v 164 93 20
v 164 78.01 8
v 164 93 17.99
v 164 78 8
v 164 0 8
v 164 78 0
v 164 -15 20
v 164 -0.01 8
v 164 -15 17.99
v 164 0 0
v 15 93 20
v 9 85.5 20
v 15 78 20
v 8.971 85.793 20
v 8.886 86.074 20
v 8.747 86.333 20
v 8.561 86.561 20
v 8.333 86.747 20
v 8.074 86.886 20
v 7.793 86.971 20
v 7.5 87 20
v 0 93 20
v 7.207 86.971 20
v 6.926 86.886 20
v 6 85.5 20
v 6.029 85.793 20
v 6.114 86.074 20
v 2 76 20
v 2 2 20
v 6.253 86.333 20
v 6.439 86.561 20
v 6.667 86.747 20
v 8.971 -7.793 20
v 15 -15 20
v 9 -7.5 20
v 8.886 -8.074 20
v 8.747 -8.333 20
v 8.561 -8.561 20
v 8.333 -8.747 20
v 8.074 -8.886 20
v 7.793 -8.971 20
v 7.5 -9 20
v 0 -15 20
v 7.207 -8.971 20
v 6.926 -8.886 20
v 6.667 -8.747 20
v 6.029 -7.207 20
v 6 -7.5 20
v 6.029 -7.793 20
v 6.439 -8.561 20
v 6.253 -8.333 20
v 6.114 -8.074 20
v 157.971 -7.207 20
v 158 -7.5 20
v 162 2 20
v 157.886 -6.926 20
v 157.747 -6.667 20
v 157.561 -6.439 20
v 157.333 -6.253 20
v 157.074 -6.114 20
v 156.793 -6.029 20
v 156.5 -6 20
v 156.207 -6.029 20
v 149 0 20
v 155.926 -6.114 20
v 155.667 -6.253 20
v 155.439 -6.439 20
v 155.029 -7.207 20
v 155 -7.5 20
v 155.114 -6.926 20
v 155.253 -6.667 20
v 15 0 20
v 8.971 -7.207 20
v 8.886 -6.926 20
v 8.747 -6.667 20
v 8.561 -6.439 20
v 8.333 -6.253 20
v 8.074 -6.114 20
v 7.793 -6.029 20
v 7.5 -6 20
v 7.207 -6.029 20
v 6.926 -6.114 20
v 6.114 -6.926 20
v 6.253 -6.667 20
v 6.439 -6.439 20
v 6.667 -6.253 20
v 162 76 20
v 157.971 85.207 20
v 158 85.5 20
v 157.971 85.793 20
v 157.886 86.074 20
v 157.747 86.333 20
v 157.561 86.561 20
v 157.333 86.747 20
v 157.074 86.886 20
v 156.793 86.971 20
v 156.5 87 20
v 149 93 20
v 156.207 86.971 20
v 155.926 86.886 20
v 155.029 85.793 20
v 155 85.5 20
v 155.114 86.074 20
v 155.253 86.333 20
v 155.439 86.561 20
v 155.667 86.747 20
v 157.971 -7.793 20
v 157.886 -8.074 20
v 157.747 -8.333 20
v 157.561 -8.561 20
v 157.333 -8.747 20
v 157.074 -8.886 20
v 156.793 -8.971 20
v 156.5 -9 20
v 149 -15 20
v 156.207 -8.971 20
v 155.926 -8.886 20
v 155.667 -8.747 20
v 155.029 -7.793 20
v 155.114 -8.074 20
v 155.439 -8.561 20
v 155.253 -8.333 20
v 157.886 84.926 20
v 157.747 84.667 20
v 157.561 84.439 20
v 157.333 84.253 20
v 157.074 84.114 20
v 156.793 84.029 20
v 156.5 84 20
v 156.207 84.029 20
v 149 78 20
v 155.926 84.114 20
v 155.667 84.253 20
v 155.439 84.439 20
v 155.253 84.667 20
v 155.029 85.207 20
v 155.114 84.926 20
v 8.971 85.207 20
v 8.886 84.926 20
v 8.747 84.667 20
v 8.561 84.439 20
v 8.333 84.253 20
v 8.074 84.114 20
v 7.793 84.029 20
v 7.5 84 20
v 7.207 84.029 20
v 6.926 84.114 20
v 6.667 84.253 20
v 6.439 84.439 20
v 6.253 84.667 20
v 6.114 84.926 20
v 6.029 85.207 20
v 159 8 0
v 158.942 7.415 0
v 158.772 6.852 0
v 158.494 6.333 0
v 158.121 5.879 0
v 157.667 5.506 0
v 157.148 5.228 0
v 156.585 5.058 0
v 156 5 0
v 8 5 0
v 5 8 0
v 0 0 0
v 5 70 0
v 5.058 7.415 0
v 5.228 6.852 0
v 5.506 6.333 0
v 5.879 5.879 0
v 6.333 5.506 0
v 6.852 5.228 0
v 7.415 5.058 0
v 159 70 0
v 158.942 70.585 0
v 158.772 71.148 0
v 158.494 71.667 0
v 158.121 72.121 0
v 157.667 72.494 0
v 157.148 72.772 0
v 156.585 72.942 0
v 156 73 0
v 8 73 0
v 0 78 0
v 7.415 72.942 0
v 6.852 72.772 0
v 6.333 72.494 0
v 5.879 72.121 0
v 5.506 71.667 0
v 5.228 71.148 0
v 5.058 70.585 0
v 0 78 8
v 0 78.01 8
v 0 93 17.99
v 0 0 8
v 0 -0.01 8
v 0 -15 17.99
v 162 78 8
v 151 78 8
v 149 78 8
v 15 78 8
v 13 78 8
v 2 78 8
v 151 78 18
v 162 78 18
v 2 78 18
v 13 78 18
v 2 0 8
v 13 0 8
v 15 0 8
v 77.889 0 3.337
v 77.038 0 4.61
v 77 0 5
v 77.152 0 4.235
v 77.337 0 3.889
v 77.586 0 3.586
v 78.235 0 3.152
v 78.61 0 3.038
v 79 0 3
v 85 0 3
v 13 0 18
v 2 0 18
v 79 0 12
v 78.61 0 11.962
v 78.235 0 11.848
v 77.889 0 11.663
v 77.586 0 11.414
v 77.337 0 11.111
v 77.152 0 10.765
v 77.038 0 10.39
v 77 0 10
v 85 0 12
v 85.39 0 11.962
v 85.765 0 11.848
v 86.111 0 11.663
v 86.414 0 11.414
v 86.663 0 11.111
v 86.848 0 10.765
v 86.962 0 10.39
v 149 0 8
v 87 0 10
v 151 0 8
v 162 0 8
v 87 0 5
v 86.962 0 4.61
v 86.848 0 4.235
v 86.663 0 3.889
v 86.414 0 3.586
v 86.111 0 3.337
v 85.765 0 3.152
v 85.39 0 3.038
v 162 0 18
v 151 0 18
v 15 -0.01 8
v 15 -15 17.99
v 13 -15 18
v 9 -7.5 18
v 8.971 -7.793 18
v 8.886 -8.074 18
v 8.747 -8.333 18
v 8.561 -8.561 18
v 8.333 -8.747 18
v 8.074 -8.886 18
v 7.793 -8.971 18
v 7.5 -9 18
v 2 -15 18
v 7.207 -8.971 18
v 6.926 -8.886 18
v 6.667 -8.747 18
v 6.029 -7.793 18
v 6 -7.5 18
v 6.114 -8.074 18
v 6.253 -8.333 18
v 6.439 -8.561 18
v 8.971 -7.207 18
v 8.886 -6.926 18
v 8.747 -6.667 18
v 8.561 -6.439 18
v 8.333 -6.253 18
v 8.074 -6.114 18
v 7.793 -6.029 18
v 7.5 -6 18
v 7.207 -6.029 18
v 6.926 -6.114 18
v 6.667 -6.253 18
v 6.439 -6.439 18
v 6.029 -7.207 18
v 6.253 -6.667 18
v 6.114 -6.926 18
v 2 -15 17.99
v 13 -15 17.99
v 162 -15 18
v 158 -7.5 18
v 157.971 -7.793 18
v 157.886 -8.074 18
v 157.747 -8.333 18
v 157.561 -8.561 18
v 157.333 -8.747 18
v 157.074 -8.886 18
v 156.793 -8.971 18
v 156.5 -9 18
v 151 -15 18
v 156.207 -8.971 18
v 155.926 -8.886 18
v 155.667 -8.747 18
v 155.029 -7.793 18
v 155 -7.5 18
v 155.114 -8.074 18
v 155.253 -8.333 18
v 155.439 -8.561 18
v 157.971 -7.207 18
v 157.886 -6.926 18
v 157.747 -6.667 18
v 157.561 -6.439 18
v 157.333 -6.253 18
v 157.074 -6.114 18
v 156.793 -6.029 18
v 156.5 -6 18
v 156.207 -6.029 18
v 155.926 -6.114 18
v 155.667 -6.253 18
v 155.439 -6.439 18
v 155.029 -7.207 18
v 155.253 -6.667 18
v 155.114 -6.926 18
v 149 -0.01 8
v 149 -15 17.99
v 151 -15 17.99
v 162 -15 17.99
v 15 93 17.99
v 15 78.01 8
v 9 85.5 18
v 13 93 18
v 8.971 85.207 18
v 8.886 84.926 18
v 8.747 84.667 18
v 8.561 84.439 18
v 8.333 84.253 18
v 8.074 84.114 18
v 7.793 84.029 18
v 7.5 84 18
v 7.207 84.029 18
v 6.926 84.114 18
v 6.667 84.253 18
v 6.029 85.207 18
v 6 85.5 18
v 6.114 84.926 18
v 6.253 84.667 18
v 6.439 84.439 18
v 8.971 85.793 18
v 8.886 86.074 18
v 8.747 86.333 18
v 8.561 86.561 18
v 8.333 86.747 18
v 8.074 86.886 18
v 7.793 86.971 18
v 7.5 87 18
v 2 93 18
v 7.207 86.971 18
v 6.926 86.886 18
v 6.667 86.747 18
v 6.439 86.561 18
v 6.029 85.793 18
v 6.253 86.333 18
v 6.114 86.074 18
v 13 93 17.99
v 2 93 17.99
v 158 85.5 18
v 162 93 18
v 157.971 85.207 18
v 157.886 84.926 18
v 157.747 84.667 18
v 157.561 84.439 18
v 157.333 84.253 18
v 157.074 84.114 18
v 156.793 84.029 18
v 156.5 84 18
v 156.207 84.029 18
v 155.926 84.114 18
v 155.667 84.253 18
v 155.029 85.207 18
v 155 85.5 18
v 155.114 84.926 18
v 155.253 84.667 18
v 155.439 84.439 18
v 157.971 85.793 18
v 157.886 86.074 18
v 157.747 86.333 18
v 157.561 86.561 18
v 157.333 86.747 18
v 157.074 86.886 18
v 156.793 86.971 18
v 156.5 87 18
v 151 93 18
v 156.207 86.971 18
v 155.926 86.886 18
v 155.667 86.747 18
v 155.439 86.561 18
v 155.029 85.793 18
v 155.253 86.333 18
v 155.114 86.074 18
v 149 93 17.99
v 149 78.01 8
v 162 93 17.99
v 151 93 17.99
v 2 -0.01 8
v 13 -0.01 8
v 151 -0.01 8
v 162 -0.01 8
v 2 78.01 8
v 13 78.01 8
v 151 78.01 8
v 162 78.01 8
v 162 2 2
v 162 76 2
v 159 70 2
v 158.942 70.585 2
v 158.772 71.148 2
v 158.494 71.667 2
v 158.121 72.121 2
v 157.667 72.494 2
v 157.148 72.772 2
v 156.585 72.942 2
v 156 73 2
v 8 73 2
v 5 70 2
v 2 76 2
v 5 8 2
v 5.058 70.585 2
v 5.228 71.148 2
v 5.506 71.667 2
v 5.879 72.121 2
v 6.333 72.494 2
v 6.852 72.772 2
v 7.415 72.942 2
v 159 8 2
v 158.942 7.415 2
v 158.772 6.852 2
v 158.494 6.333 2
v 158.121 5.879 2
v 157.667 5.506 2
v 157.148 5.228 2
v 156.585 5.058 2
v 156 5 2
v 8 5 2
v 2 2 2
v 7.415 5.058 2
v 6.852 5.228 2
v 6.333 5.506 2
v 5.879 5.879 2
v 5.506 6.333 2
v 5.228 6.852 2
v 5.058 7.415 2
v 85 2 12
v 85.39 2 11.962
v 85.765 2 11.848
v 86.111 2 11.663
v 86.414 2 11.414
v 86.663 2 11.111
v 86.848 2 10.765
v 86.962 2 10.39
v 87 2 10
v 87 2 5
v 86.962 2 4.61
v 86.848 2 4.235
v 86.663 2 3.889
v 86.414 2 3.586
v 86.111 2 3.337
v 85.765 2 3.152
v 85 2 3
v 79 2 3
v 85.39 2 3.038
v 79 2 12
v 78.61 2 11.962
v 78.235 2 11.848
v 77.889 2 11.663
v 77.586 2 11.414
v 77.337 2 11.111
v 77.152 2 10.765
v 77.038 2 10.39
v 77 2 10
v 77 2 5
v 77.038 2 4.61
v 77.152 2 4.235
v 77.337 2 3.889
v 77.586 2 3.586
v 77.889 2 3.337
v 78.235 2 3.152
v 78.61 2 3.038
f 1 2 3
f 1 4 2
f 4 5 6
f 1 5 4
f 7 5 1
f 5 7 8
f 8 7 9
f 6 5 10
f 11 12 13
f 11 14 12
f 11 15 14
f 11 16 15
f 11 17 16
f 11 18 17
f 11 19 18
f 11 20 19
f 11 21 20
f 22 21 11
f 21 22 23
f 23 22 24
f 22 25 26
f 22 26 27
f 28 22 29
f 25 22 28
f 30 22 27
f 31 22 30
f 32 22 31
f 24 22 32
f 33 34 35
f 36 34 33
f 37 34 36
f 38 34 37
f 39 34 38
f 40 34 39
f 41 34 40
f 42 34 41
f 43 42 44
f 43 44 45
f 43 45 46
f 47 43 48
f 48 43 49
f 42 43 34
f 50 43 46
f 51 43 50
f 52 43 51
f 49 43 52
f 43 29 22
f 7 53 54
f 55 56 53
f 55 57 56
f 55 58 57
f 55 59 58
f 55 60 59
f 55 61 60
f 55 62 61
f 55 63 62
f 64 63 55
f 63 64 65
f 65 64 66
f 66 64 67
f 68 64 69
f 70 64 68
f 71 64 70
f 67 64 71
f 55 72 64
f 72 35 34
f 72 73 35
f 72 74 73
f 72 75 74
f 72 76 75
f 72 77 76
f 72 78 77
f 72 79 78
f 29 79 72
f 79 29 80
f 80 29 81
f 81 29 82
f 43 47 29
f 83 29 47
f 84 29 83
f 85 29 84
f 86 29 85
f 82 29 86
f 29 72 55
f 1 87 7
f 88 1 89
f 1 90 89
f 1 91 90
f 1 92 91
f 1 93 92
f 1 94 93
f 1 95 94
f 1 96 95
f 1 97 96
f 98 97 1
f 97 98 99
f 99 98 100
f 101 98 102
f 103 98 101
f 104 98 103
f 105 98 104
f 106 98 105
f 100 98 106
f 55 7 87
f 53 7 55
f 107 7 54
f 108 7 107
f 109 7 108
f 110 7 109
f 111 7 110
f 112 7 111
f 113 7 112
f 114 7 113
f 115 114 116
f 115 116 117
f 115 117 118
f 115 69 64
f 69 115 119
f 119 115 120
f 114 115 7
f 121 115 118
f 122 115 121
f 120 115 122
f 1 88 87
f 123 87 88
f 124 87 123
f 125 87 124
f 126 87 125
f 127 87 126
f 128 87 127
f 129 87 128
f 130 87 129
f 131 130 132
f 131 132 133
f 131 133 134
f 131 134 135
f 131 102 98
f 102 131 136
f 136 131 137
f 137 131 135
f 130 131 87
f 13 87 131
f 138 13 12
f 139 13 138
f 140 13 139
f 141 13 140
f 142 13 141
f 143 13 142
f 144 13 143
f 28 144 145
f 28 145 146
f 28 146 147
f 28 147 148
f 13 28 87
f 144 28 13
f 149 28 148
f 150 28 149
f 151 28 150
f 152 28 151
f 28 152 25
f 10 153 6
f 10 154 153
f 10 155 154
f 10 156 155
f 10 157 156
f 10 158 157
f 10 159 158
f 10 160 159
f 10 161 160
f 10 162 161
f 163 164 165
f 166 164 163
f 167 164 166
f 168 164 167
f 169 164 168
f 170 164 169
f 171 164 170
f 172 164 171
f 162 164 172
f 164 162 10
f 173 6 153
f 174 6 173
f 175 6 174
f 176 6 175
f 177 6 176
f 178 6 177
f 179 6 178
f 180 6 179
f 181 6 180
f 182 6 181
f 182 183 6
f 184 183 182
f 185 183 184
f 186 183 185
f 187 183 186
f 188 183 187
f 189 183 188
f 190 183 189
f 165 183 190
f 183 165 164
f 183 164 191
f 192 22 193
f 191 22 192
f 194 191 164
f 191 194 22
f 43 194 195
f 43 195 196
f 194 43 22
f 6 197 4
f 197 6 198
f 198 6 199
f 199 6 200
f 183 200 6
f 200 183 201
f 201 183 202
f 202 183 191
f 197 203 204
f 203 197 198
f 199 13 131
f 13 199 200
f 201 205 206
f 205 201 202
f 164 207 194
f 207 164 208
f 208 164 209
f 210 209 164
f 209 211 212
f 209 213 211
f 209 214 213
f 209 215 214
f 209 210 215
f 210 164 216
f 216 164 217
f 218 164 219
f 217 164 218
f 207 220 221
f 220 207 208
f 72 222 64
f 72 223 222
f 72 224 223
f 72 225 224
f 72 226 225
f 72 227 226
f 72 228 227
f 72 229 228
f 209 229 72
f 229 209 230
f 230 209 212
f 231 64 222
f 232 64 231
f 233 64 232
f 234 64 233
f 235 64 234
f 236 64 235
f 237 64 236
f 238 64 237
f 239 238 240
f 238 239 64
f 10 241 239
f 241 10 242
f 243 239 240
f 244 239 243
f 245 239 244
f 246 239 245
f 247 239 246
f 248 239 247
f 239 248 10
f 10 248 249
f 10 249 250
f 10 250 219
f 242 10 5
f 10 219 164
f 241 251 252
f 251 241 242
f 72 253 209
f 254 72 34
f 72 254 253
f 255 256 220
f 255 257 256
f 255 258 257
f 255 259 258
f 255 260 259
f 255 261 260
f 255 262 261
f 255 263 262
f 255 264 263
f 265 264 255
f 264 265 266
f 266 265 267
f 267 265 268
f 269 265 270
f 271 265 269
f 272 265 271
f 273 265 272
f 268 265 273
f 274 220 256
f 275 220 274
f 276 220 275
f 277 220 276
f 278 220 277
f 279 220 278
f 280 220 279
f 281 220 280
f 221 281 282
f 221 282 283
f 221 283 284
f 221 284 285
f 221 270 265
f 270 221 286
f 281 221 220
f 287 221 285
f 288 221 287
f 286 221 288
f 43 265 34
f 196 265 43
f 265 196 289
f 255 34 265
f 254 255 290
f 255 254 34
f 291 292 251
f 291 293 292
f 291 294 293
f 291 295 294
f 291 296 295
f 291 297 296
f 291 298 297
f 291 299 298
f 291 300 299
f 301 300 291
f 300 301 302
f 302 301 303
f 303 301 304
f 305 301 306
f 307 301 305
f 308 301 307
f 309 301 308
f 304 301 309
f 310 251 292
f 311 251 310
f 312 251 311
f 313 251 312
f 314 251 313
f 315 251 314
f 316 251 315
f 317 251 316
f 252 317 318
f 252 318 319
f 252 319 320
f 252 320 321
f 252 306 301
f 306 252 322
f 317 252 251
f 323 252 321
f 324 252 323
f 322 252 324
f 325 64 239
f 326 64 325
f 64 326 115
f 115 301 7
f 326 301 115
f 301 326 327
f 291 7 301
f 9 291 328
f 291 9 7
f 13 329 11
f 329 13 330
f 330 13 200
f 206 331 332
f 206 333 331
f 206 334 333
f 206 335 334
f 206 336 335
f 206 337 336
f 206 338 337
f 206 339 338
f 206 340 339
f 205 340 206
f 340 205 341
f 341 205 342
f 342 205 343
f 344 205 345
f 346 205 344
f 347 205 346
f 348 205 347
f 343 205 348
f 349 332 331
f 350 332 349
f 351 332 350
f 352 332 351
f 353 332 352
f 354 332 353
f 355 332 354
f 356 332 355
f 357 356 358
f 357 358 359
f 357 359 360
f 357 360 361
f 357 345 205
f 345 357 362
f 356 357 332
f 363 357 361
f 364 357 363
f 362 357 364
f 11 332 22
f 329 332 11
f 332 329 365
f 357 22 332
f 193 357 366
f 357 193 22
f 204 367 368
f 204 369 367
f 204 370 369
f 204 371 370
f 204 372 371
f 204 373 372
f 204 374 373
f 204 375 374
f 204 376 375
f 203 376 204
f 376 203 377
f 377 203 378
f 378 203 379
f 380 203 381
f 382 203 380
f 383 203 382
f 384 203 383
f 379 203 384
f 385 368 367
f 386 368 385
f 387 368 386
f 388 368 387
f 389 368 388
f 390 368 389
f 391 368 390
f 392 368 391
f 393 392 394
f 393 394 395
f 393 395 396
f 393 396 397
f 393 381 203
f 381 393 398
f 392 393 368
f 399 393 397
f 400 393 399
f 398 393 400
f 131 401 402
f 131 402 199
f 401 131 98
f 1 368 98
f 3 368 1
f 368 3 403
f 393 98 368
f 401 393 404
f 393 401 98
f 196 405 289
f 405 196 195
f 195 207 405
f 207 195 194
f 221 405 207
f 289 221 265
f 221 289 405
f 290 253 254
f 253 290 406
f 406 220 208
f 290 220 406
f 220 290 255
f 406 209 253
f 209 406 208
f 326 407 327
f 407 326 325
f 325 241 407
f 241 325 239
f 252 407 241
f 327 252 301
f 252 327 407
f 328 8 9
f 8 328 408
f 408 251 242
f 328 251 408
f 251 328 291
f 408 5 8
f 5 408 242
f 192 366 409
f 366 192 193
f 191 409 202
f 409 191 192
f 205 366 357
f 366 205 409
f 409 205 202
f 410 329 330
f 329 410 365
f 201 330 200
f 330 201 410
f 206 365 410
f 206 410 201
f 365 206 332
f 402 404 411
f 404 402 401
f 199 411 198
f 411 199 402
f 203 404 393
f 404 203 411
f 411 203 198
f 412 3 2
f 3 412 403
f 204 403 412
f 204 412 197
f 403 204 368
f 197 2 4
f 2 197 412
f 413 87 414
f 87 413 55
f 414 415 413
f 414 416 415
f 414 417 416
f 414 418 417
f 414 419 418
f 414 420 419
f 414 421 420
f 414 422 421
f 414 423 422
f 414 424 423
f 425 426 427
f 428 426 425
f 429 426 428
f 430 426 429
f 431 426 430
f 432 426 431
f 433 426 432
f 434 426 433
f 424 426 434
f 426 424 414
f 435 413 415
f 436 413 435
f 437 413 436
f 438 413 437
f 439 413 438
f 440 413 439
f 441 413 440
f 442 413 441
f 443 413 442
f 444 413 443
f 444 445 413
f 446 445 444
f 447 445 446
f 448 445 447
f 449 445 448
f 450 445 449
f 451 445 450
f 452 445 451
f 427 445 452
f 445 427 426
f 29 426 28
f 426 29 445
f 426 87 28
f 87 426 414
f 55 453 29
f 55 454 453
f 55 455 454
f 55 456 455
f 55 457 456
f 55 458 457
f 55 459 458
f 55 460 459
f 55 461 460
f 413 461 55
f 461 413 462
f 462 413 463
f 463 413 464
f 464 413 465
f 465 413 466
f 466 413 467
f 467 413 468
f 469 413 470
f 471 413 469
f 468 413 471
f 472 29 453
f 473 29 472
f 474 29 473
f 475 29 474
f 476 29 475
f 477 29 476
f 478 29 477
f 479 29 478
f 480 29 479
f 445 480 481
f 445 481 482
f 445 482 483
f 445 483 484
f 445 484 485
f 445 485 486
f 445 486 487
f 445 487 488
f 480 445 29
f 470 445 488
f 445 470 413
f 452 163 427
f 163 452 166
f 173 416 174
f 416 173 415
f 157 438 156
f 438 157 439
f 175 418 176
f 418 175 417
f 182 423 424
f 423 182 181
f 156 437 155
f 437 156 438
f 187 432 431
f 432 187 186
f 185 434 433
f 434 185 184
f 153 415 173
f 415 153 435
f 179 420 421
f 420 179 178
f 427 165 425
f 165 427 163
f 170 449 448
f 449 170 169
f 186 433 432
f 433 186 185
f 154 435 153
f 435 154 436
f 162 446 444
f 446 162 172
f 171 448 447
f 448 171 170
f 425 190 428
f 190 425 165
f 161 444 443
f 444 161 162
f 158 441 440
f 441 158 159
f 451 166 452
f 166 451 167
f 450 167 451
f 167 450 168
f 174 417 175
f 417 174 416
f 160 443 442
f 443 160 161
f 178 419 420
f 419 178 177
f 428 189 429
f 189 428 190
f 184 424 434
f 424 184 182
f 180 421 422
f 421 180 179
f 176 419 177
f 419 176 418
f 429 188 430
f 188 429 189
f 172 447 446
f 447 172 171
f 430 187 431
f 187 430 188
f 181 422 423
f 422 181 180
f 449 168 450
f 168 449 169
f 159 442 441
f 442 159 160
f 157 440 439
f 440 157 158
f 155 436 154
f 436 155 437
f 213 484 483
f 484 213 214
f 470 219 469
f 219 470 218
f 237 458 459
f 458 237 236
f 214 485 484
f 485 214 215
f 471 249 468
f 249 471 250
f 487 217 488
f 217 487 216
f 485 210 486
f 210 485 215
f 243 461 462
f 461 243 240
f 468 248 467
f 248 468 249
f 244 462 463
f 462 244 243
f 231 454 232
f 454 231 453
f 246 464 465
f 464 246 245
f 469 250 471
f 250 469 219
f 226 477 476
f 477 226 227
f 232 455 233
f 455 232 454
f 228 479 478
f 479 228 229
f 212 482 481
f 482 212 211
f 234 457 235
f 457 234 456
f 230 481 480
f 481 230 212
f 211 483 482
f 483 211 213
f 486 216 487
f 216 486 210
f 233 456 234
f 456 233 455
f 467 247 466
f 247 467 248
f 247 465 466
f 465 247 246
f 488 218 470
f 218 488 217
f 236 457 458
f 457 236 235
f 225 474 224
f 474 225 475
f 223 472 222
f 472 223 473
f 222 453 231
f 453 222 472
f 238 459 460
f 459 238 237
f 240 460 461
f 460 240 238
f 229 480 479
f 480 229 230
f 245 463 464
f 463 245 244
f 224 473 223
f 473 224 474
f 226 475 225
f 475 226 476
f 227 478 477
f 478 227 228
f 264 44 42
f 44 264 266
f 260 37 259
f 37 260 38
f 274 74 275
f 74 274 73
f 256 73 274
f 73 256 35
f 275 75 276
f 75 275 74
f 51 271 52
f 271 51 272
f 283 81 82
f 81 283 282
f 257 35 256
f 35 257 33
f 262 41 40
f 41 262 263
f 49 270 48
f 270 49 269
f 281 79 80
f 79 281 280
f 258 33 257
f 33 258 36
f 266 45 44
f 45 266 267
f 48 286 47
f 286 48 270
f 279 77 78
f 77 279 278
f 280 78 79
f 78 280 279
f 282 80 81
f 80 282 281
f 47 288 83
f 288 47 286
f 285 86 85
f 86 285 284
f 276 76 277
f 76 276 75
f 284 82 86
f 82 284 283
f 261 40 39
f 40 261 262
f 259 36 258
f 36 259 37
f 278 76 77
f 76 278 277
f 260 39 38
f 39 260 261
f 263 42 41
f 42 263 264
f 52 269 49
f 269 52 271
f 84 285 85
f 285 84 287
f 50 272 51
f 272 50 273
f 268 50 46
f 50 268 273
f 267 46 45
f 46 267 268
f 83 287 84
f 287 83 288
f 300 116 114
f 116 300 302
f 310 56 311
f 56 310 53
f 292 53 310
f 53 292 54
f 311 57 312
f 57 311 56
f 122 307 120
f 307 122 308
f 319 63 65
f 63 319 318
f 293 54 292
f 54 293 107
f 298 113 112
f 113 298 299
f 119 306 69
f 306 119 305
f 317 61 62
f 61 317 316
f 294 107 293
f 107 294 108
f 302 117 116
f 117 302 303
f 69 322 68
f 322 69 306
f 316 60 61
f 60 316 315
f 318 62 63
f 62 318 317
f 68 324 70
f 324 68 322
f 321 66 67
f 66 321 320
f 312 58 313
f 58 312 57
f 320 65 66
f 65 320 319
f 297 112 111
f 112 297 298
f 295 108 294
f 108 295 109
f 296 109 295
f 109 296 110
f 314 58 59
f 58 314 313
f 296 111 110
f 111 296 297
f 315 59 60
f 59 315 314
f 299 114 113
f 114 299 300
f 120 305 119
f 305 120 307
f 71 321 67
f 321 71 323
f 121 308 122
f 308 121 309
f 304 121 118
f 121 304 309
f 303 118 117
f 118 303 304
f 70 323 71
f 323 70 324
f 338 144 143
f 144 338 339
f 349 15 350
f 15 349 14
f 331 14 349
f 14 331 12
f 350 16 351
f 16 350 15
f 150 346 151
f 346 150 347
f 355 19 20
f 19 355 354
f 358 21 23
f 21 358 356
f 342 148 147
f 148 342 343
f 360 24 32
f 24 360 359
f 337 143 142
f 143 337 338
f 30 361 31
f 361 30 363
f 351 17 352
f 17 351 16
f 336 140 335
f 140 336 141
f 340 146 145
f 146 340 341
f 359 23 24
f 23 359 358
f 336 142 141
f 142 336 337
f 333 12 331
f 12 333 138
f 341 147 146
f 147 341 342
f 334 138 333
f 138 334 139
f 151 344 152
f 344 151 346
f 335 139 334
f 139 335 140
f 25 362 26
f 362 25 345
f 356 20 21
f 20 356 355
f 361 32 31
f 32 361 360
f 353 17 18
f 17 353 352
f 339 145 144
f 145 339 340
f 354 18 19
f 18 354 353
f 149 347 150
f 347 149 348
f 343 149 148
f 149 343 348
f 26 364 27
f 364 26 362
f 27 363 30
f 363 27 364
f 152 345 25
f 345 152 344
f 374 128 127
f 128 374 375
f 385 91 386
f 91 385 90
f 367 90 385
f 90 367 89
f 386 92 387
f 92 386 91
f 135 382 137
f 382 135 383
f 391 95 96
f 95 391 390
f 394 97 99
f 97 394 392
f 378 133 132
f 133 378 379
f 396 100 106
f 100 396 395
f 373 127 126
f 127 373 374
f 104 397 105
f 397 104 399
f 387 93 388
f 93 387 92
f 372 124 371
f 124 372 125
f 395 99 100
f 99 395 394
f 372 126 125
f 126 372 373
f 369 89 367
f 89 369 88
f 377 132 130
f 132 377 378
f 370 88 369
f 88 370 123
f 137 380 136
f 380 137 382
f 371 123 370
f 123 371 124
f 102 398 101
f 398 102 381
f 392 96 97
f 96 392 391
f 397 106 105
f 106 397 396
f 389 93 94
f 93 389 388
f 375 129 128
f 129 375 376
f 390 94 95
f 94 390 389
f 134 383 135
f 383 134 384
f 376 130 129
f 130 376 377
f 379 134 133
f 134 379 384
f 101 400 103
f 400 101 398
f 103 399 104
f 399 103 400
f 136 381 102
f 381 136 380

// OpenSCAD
// Box enclosure for 160x74x18mm object

// Inner dimensions (the object to enclose)
inner_length = 160;
inner_width = 74;
inner_height = 18;

// Wall thickness
wall = 2;

// Bottom hole inset from inner walls
hole_inset = 3;

// Bottom hole corner radius
hole_corner_radius = 3;

// Side hole dimensions
side_hole_width = 10;
side_hole_height = 8;
side_hole_corner_radius = 2;

// Overhang dimensions
overhang_width = 15;
overhang_length = 15;

// Screw hole diameter
screw_hole_d = 3;

// Gusset dimensions
gusset_thickness = 2;
gusset_height = 10;

// Outer dimensions
outer_length = inner_length + 2 * wall;
outer_width = inner_width + 2 * wall;
outer_height = inner_height + wall; // wall on bottom only, open top

// Bottom hole dimensions
hole_length = inner_length - 2 * hole_inset;
hole_width = inner_width - 2 * hole_inset;

// Overhang positions along X (flush to edges)
overhang_x1 = 0;
overhang_x2 = outer_length - overhang_width;

// Rounded rectangle module
module rounded_rect(length, width, height, radius) {
    translate([radius, radius, 0])
        hull() {
            cylinder(h = height, r = radius, $fn = 32);
            translate([length - 2 * radius, 0, 0])
                cylinder(h = height, r = radius, $fn = 32);
            translate([0, width - 2 * radius, 0])
                cylinder(h = height, r = radius, $fn = 32);
            translate([length - 2 * radius, width - 2 * radius, 0])
                cylinder(h = height, r = radius, $fn = 32);
        }
}

// Gusset module: right-triangle brace
module gusset(length, height, thickness) {
    hull() {
        cube([thickness, 0.01, height]);
        translate([0, length - 0.01, height - 0.01])
            cube([thickness, 0.01, 0.01]);
    }
}

difference() {
    union() {
        // Outer shell
        cube([outer_length, outer_width, outer_height]);

        // Left side overhangs (Y=0, extending in -Y)
        translate([overhang_x1, -overhang_length, outer_height - wall])
            cube([overhang_width, overhang_length, wall]);
        translate([overhang_x2, -overhang_length, outer_height - wall])
            cube([overhang_width, overhang_length, wall]);

        // Right side overhangs (Y=outer_width, extending in +Y)
        translate([overhang_x1, outer_width, outer_height - wall])
            cube([overhang_width, overhang_length, wall]);
        translate([overhang_x2, outer_width, outer_height - wall])
            cube([overhang_width, overhang_length, wall]);

        // Gussets - left side, front overhang
        translate([overhang_x1, 0, outer_height - wall - gusset_height])
            mirror([0, 1, 0])
                gusset(overhang_length, gusset_height, gusset_thickness);
        translate([overhang_x1 + overhang_width - gusset_thickness, 0, outer_height - wall - gusset_height])
            mirror([0, 1, 0])
                gusset(overhang_length, gusset_height, gusset_thickness);

        // Gussets - left side, rear overhang
        translate([overhang_x2, 0, outer_height - wall - gusset_height])
            mirror([0, 1, 0])
                gusset(overhang_length, gusset_height, gusset_thickness);
        translate([overhang_x2 + overhang_width - gusset_thickness, 0, outer_height - wall - gusset_height])
            mirror([0, 1, 0])
                gusset(overhang_length, gusset_height, gusset_thickness);

        // Gussets - right side, front overhang
        translate([overhang_x1, outer_width, outer_height - wall - gusset_height])
            gusset(overhang_length, gusset_height, gusset_thickness);
        translate([overhang_x1 + overhang_width - gusset_thickness, outer_width, outer_height - wall - gusset_height])
            gusset(overhang_length, gusset_height, gusset_thickness);

        // Gussets - right side, rear overhang
        translate([overhang_x2, outer_width, outer_height - wall - gusset_height])
            gusset(overhang_length, gusset_height, gusset_thickness);
        translate([overhang_x2 + overhang_width - gusset_thickness, outer_width, outer_height - wall - gusset_height])
            gusset(overhang_length, gusset_height, gusset_thickness);
    }

    // Inner cavity
    translate([wall, wall, wall])
        cube([inner_length, inner_width, inner_height + 1]);

    // Rounded square hole in the bottom
    translate([wall + hole_inset, wall + hole_inset, -1])
        rounded_rect(hole_length, hole_width, wall + 2, hole_corner_radius);

    // Rounded hole on the long side (front), centered horizontally, near top edge
    translate([outer_length / 2 - side_hole_width / 2, -1, outer_height - side_hole_height])
        rotate([-90, 0, 0])
            rounded_rect(side_hole_width, side_hole_height + 1, wall + 2, side_hole_corner_radius);

    // Screw holes in overhangs - left side
    translate([overhang_x1 + overhang_width / 2, -overhang_length / 2, outer_height - wall - 1])
        cylinder(h = wall + 2, d = screw_hole_d, $fn = 32);
    translate([overhang_x2 + overhang_width / 2, -overhang_length / 2, outer_height - wall - 1])
        cylinder(h = wall + 2, d = screw_hole_d, $fn = 32);

    // Screw holes in overhangs - right side
    translate([overhang_x1 + overhang_width / 2, outer_width + overhang_length / 2, outer_height - wall - 1])
        cylinder(h = wall + 2, d = screw_hole_d, $fn = 32);
    translate([overhang_x2 + overhang_width / 2, outer_width + overhang_length / 2, outer_height - wall - 1])
        cylinder(h = wall + 2, d = screw_hole_d, $fn = 32);
}
